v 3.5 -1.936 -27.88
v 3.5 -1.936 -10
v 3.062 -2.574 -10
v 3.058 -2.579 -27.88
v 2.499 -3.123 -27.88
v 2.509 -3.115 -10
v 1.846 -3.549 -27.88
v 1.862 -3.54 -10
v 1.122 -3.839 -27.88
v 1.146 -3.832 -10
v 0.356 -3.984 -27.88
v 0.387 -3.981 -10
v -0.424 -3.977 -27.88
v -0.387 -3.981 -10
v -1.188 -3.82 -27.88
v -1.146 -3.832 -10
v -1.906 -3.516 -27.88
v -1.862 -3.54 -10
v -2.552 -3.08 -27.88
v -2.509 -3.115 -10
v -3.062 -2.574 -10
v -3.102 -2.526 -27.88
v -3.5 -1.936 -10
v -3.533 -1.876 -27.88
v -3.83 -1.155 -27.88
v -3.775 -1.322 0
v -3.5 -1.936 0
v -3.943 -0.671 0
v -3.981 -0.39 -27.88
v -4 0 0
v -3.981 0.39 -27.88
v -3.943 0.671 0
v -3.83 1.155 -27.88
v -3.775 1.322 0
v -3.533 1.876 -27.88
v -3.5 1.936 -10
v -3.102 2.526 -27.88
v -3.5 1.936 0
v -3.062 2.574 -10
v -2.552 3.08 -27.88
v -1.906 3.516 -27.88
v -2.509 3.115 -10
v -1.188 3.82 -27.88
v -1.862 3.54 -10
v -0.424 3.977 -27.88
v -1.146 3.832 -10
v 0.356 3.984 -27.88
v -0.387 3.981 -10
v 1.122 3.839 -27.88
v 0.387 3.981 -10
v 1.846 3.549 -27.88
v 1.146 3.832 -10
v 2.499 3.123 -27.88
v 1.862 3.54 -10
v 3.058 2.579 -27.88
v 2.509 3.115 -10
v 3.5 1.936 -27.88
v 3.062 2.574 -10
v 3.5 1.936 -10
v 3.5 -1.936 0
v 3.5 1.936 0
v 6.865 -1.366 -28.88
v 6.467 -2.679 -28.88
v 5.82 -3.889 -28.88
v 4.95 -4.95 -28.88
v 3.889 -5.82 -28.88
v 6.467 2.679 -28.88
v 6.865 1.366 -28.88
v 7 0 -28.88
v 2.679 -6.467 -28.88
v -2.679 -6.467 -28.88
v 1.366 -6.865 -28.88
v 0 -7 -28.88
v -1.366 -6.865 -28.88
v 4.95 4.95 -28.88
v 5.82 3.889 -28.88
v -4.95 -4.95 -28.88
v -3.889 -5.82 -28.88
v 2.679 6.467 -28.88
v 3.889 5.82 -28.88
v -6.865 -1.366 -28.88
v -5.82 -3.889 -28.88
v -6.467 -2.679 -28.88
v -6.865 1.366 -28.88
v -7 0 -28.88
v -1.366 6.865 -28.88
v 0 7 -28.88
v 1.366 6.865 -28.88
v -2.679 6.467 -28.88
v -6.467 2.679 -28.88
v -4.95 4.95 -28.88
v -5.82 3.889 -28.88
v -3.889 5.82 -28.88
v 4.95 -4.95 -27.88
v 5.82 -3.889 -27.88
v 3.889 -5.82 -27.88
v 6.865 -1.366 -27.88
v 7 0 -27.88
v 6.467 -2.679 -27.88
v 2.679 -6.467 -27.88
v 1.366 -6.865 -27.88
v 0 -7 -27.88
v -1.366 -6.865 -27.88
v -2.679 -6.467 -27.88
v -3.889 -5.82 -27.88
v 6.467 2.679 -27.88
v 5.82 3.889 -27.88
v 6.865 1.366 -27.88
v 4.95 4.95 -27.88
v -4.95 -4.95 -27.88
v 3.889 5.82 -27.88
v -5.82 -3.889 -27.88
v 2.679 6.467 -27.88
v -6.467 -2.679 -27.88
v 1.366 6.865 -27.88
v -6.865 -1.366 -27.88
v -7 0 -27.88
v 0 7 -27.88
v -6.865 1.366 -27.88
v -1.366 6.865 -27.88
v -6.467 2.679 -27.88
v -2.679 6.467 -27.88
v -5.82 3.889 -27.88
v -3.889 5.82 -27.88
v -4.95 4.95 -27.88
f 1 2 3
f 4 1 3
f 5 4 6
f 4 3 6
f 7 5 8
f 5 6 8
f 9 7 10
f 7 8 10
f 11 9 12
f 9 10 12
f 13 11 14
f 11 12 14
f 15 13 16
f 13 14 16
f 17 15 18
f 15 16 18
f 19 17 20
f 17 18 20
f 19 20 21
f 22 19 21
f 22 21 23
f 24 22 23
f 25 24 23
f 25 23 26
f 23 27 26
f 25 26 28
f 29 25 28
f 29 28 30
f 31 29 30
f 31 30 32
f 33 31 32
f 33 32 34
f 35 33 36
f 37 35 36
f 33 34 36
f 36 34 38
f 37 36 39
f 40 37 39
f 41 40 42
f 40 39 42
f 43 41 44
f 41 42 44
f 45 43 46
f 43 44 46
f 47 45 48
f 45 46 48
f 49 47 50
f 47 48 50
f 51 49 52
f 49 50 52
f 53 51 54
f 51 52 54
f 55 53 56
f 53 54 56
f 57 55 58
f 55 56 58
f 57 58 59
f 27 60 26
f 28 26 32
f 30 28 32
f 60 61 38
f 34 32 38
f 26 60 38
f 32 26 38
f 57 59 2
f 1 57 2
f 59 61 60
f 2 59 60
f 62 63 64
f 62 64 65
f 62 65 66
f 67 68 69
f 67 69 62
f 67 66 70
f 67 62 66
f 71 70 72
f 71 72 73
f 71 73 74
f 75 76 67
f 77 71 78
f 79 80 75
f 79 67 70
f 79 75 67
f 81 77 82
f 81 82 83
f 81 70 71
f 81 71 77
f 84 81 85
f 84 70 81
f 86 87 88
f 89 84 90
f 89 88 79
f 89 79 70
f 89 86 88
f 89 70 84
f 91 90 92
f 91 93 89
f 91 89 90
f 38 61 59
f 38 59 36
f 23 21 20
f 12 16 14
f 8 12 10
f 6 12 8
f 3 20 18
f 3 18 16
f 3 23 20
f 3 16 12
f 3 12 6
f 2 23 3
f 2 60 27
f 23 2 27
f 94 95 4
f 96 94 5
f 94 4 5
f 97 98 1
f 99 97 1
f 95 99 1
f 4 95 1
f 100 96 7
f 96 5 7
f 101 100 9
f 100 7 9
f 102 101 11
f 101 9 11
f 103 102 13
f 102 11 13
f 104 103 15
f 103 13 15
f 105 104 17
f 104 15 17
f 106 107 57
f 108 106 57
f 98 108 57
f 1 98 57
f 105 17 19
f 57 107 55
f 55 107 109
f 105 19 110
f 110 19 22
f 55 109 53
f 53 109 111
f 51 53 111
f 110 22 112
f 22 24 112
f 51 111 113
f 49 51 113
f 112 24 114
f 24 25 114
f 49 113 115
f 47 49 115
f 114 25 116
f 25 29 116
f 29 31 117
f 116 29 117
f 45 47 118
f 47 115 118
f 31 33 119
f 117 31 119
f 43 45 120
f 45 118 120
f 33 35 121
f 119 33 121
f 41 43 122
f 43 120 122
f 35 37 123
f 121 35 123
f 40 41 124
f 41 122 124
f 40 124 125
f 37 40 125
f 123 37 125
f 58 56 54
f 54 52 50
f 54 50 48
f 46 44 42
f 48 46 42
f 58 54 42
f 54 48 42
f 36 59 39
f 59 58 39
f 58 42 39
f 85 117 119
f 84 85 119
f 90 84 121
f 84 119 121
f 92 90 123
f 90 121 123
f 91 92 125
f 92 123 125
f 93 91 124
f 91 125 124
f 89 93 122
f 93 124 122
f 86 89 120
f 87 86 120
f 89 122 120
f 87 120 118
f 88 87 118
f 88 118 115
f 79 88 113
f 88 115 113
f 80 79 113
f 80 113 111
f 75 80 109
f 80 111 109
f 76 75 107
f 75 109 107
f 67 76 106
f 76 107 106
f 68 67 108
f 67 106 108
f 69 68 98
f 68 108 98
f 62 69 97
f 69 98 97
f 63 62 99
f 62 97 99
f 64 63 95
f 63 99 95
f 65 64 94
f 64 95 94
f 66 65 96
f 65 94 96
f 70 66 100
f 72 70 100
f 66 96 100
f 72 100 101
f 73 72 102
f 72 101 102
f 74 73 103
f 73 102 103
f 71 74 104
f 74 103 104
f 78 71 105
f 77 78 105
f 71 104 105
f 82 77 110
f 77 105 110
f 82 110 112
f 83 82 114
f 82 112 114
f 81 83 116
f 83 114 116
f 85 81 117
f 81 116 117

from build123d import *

# Parameters (mm, degrees)
BOSS_EXTRUDE1_DEPTH = 27.8796339
CUT_EXTRUDE1_DEPTH  = 10
SKETCH3_R           = 7
BOSS_EXTRUDE2_DEPTH = 1


with BuildPart() as part:
    # Sketch1 → Boss-Extrude1 (new body)
    with BuildSketch(Plane.XY):
        with BuildLine():
            Line((3.5, 1.936491673), (3.5, -1.936491673))
            ThreePointArc((3.5, -1.936491673), (-4, 0), (3.5, 1.936491673))
        make_face()
    extrude(amount=-BOSS_EXTRUDE1_DEPTH)

    # Sketch2 → Cut-Extrude1 (cut)
    with BuildSketch(Plane.XY):
        with BuildLine():
            Line((3.5, 1.936491673), (-3.5, 1.936491673))
            ThreePointArc((-3.5, 1.936491673), (0, 4), (3.5, 1.936491673))
        make_face()
        with BuildLine():
            Line((3.5, -1.936491673), (-3.5, -1.936491673))
            ThreePointArc((-3.5, -1.936491673), (0, -4), (3.5, -1.936491673))
        make_face()
    extrude(amount=-CUT_EXTRUDE1_DEPTH, mode=Mode.SUBTRACT)

    # Sketch3 → Boss-Extrude2 (add)
    with BuildSketch(Plane(origin=(0, 0, -27.8796339), x_dir=(-1, 0, 0), z_dir=(0, 0, -1))):
        Circle(SKETCH3_R)
    extrude(amount=BOSS_EXTRUDE2_DEPTH)


solid = part.part
